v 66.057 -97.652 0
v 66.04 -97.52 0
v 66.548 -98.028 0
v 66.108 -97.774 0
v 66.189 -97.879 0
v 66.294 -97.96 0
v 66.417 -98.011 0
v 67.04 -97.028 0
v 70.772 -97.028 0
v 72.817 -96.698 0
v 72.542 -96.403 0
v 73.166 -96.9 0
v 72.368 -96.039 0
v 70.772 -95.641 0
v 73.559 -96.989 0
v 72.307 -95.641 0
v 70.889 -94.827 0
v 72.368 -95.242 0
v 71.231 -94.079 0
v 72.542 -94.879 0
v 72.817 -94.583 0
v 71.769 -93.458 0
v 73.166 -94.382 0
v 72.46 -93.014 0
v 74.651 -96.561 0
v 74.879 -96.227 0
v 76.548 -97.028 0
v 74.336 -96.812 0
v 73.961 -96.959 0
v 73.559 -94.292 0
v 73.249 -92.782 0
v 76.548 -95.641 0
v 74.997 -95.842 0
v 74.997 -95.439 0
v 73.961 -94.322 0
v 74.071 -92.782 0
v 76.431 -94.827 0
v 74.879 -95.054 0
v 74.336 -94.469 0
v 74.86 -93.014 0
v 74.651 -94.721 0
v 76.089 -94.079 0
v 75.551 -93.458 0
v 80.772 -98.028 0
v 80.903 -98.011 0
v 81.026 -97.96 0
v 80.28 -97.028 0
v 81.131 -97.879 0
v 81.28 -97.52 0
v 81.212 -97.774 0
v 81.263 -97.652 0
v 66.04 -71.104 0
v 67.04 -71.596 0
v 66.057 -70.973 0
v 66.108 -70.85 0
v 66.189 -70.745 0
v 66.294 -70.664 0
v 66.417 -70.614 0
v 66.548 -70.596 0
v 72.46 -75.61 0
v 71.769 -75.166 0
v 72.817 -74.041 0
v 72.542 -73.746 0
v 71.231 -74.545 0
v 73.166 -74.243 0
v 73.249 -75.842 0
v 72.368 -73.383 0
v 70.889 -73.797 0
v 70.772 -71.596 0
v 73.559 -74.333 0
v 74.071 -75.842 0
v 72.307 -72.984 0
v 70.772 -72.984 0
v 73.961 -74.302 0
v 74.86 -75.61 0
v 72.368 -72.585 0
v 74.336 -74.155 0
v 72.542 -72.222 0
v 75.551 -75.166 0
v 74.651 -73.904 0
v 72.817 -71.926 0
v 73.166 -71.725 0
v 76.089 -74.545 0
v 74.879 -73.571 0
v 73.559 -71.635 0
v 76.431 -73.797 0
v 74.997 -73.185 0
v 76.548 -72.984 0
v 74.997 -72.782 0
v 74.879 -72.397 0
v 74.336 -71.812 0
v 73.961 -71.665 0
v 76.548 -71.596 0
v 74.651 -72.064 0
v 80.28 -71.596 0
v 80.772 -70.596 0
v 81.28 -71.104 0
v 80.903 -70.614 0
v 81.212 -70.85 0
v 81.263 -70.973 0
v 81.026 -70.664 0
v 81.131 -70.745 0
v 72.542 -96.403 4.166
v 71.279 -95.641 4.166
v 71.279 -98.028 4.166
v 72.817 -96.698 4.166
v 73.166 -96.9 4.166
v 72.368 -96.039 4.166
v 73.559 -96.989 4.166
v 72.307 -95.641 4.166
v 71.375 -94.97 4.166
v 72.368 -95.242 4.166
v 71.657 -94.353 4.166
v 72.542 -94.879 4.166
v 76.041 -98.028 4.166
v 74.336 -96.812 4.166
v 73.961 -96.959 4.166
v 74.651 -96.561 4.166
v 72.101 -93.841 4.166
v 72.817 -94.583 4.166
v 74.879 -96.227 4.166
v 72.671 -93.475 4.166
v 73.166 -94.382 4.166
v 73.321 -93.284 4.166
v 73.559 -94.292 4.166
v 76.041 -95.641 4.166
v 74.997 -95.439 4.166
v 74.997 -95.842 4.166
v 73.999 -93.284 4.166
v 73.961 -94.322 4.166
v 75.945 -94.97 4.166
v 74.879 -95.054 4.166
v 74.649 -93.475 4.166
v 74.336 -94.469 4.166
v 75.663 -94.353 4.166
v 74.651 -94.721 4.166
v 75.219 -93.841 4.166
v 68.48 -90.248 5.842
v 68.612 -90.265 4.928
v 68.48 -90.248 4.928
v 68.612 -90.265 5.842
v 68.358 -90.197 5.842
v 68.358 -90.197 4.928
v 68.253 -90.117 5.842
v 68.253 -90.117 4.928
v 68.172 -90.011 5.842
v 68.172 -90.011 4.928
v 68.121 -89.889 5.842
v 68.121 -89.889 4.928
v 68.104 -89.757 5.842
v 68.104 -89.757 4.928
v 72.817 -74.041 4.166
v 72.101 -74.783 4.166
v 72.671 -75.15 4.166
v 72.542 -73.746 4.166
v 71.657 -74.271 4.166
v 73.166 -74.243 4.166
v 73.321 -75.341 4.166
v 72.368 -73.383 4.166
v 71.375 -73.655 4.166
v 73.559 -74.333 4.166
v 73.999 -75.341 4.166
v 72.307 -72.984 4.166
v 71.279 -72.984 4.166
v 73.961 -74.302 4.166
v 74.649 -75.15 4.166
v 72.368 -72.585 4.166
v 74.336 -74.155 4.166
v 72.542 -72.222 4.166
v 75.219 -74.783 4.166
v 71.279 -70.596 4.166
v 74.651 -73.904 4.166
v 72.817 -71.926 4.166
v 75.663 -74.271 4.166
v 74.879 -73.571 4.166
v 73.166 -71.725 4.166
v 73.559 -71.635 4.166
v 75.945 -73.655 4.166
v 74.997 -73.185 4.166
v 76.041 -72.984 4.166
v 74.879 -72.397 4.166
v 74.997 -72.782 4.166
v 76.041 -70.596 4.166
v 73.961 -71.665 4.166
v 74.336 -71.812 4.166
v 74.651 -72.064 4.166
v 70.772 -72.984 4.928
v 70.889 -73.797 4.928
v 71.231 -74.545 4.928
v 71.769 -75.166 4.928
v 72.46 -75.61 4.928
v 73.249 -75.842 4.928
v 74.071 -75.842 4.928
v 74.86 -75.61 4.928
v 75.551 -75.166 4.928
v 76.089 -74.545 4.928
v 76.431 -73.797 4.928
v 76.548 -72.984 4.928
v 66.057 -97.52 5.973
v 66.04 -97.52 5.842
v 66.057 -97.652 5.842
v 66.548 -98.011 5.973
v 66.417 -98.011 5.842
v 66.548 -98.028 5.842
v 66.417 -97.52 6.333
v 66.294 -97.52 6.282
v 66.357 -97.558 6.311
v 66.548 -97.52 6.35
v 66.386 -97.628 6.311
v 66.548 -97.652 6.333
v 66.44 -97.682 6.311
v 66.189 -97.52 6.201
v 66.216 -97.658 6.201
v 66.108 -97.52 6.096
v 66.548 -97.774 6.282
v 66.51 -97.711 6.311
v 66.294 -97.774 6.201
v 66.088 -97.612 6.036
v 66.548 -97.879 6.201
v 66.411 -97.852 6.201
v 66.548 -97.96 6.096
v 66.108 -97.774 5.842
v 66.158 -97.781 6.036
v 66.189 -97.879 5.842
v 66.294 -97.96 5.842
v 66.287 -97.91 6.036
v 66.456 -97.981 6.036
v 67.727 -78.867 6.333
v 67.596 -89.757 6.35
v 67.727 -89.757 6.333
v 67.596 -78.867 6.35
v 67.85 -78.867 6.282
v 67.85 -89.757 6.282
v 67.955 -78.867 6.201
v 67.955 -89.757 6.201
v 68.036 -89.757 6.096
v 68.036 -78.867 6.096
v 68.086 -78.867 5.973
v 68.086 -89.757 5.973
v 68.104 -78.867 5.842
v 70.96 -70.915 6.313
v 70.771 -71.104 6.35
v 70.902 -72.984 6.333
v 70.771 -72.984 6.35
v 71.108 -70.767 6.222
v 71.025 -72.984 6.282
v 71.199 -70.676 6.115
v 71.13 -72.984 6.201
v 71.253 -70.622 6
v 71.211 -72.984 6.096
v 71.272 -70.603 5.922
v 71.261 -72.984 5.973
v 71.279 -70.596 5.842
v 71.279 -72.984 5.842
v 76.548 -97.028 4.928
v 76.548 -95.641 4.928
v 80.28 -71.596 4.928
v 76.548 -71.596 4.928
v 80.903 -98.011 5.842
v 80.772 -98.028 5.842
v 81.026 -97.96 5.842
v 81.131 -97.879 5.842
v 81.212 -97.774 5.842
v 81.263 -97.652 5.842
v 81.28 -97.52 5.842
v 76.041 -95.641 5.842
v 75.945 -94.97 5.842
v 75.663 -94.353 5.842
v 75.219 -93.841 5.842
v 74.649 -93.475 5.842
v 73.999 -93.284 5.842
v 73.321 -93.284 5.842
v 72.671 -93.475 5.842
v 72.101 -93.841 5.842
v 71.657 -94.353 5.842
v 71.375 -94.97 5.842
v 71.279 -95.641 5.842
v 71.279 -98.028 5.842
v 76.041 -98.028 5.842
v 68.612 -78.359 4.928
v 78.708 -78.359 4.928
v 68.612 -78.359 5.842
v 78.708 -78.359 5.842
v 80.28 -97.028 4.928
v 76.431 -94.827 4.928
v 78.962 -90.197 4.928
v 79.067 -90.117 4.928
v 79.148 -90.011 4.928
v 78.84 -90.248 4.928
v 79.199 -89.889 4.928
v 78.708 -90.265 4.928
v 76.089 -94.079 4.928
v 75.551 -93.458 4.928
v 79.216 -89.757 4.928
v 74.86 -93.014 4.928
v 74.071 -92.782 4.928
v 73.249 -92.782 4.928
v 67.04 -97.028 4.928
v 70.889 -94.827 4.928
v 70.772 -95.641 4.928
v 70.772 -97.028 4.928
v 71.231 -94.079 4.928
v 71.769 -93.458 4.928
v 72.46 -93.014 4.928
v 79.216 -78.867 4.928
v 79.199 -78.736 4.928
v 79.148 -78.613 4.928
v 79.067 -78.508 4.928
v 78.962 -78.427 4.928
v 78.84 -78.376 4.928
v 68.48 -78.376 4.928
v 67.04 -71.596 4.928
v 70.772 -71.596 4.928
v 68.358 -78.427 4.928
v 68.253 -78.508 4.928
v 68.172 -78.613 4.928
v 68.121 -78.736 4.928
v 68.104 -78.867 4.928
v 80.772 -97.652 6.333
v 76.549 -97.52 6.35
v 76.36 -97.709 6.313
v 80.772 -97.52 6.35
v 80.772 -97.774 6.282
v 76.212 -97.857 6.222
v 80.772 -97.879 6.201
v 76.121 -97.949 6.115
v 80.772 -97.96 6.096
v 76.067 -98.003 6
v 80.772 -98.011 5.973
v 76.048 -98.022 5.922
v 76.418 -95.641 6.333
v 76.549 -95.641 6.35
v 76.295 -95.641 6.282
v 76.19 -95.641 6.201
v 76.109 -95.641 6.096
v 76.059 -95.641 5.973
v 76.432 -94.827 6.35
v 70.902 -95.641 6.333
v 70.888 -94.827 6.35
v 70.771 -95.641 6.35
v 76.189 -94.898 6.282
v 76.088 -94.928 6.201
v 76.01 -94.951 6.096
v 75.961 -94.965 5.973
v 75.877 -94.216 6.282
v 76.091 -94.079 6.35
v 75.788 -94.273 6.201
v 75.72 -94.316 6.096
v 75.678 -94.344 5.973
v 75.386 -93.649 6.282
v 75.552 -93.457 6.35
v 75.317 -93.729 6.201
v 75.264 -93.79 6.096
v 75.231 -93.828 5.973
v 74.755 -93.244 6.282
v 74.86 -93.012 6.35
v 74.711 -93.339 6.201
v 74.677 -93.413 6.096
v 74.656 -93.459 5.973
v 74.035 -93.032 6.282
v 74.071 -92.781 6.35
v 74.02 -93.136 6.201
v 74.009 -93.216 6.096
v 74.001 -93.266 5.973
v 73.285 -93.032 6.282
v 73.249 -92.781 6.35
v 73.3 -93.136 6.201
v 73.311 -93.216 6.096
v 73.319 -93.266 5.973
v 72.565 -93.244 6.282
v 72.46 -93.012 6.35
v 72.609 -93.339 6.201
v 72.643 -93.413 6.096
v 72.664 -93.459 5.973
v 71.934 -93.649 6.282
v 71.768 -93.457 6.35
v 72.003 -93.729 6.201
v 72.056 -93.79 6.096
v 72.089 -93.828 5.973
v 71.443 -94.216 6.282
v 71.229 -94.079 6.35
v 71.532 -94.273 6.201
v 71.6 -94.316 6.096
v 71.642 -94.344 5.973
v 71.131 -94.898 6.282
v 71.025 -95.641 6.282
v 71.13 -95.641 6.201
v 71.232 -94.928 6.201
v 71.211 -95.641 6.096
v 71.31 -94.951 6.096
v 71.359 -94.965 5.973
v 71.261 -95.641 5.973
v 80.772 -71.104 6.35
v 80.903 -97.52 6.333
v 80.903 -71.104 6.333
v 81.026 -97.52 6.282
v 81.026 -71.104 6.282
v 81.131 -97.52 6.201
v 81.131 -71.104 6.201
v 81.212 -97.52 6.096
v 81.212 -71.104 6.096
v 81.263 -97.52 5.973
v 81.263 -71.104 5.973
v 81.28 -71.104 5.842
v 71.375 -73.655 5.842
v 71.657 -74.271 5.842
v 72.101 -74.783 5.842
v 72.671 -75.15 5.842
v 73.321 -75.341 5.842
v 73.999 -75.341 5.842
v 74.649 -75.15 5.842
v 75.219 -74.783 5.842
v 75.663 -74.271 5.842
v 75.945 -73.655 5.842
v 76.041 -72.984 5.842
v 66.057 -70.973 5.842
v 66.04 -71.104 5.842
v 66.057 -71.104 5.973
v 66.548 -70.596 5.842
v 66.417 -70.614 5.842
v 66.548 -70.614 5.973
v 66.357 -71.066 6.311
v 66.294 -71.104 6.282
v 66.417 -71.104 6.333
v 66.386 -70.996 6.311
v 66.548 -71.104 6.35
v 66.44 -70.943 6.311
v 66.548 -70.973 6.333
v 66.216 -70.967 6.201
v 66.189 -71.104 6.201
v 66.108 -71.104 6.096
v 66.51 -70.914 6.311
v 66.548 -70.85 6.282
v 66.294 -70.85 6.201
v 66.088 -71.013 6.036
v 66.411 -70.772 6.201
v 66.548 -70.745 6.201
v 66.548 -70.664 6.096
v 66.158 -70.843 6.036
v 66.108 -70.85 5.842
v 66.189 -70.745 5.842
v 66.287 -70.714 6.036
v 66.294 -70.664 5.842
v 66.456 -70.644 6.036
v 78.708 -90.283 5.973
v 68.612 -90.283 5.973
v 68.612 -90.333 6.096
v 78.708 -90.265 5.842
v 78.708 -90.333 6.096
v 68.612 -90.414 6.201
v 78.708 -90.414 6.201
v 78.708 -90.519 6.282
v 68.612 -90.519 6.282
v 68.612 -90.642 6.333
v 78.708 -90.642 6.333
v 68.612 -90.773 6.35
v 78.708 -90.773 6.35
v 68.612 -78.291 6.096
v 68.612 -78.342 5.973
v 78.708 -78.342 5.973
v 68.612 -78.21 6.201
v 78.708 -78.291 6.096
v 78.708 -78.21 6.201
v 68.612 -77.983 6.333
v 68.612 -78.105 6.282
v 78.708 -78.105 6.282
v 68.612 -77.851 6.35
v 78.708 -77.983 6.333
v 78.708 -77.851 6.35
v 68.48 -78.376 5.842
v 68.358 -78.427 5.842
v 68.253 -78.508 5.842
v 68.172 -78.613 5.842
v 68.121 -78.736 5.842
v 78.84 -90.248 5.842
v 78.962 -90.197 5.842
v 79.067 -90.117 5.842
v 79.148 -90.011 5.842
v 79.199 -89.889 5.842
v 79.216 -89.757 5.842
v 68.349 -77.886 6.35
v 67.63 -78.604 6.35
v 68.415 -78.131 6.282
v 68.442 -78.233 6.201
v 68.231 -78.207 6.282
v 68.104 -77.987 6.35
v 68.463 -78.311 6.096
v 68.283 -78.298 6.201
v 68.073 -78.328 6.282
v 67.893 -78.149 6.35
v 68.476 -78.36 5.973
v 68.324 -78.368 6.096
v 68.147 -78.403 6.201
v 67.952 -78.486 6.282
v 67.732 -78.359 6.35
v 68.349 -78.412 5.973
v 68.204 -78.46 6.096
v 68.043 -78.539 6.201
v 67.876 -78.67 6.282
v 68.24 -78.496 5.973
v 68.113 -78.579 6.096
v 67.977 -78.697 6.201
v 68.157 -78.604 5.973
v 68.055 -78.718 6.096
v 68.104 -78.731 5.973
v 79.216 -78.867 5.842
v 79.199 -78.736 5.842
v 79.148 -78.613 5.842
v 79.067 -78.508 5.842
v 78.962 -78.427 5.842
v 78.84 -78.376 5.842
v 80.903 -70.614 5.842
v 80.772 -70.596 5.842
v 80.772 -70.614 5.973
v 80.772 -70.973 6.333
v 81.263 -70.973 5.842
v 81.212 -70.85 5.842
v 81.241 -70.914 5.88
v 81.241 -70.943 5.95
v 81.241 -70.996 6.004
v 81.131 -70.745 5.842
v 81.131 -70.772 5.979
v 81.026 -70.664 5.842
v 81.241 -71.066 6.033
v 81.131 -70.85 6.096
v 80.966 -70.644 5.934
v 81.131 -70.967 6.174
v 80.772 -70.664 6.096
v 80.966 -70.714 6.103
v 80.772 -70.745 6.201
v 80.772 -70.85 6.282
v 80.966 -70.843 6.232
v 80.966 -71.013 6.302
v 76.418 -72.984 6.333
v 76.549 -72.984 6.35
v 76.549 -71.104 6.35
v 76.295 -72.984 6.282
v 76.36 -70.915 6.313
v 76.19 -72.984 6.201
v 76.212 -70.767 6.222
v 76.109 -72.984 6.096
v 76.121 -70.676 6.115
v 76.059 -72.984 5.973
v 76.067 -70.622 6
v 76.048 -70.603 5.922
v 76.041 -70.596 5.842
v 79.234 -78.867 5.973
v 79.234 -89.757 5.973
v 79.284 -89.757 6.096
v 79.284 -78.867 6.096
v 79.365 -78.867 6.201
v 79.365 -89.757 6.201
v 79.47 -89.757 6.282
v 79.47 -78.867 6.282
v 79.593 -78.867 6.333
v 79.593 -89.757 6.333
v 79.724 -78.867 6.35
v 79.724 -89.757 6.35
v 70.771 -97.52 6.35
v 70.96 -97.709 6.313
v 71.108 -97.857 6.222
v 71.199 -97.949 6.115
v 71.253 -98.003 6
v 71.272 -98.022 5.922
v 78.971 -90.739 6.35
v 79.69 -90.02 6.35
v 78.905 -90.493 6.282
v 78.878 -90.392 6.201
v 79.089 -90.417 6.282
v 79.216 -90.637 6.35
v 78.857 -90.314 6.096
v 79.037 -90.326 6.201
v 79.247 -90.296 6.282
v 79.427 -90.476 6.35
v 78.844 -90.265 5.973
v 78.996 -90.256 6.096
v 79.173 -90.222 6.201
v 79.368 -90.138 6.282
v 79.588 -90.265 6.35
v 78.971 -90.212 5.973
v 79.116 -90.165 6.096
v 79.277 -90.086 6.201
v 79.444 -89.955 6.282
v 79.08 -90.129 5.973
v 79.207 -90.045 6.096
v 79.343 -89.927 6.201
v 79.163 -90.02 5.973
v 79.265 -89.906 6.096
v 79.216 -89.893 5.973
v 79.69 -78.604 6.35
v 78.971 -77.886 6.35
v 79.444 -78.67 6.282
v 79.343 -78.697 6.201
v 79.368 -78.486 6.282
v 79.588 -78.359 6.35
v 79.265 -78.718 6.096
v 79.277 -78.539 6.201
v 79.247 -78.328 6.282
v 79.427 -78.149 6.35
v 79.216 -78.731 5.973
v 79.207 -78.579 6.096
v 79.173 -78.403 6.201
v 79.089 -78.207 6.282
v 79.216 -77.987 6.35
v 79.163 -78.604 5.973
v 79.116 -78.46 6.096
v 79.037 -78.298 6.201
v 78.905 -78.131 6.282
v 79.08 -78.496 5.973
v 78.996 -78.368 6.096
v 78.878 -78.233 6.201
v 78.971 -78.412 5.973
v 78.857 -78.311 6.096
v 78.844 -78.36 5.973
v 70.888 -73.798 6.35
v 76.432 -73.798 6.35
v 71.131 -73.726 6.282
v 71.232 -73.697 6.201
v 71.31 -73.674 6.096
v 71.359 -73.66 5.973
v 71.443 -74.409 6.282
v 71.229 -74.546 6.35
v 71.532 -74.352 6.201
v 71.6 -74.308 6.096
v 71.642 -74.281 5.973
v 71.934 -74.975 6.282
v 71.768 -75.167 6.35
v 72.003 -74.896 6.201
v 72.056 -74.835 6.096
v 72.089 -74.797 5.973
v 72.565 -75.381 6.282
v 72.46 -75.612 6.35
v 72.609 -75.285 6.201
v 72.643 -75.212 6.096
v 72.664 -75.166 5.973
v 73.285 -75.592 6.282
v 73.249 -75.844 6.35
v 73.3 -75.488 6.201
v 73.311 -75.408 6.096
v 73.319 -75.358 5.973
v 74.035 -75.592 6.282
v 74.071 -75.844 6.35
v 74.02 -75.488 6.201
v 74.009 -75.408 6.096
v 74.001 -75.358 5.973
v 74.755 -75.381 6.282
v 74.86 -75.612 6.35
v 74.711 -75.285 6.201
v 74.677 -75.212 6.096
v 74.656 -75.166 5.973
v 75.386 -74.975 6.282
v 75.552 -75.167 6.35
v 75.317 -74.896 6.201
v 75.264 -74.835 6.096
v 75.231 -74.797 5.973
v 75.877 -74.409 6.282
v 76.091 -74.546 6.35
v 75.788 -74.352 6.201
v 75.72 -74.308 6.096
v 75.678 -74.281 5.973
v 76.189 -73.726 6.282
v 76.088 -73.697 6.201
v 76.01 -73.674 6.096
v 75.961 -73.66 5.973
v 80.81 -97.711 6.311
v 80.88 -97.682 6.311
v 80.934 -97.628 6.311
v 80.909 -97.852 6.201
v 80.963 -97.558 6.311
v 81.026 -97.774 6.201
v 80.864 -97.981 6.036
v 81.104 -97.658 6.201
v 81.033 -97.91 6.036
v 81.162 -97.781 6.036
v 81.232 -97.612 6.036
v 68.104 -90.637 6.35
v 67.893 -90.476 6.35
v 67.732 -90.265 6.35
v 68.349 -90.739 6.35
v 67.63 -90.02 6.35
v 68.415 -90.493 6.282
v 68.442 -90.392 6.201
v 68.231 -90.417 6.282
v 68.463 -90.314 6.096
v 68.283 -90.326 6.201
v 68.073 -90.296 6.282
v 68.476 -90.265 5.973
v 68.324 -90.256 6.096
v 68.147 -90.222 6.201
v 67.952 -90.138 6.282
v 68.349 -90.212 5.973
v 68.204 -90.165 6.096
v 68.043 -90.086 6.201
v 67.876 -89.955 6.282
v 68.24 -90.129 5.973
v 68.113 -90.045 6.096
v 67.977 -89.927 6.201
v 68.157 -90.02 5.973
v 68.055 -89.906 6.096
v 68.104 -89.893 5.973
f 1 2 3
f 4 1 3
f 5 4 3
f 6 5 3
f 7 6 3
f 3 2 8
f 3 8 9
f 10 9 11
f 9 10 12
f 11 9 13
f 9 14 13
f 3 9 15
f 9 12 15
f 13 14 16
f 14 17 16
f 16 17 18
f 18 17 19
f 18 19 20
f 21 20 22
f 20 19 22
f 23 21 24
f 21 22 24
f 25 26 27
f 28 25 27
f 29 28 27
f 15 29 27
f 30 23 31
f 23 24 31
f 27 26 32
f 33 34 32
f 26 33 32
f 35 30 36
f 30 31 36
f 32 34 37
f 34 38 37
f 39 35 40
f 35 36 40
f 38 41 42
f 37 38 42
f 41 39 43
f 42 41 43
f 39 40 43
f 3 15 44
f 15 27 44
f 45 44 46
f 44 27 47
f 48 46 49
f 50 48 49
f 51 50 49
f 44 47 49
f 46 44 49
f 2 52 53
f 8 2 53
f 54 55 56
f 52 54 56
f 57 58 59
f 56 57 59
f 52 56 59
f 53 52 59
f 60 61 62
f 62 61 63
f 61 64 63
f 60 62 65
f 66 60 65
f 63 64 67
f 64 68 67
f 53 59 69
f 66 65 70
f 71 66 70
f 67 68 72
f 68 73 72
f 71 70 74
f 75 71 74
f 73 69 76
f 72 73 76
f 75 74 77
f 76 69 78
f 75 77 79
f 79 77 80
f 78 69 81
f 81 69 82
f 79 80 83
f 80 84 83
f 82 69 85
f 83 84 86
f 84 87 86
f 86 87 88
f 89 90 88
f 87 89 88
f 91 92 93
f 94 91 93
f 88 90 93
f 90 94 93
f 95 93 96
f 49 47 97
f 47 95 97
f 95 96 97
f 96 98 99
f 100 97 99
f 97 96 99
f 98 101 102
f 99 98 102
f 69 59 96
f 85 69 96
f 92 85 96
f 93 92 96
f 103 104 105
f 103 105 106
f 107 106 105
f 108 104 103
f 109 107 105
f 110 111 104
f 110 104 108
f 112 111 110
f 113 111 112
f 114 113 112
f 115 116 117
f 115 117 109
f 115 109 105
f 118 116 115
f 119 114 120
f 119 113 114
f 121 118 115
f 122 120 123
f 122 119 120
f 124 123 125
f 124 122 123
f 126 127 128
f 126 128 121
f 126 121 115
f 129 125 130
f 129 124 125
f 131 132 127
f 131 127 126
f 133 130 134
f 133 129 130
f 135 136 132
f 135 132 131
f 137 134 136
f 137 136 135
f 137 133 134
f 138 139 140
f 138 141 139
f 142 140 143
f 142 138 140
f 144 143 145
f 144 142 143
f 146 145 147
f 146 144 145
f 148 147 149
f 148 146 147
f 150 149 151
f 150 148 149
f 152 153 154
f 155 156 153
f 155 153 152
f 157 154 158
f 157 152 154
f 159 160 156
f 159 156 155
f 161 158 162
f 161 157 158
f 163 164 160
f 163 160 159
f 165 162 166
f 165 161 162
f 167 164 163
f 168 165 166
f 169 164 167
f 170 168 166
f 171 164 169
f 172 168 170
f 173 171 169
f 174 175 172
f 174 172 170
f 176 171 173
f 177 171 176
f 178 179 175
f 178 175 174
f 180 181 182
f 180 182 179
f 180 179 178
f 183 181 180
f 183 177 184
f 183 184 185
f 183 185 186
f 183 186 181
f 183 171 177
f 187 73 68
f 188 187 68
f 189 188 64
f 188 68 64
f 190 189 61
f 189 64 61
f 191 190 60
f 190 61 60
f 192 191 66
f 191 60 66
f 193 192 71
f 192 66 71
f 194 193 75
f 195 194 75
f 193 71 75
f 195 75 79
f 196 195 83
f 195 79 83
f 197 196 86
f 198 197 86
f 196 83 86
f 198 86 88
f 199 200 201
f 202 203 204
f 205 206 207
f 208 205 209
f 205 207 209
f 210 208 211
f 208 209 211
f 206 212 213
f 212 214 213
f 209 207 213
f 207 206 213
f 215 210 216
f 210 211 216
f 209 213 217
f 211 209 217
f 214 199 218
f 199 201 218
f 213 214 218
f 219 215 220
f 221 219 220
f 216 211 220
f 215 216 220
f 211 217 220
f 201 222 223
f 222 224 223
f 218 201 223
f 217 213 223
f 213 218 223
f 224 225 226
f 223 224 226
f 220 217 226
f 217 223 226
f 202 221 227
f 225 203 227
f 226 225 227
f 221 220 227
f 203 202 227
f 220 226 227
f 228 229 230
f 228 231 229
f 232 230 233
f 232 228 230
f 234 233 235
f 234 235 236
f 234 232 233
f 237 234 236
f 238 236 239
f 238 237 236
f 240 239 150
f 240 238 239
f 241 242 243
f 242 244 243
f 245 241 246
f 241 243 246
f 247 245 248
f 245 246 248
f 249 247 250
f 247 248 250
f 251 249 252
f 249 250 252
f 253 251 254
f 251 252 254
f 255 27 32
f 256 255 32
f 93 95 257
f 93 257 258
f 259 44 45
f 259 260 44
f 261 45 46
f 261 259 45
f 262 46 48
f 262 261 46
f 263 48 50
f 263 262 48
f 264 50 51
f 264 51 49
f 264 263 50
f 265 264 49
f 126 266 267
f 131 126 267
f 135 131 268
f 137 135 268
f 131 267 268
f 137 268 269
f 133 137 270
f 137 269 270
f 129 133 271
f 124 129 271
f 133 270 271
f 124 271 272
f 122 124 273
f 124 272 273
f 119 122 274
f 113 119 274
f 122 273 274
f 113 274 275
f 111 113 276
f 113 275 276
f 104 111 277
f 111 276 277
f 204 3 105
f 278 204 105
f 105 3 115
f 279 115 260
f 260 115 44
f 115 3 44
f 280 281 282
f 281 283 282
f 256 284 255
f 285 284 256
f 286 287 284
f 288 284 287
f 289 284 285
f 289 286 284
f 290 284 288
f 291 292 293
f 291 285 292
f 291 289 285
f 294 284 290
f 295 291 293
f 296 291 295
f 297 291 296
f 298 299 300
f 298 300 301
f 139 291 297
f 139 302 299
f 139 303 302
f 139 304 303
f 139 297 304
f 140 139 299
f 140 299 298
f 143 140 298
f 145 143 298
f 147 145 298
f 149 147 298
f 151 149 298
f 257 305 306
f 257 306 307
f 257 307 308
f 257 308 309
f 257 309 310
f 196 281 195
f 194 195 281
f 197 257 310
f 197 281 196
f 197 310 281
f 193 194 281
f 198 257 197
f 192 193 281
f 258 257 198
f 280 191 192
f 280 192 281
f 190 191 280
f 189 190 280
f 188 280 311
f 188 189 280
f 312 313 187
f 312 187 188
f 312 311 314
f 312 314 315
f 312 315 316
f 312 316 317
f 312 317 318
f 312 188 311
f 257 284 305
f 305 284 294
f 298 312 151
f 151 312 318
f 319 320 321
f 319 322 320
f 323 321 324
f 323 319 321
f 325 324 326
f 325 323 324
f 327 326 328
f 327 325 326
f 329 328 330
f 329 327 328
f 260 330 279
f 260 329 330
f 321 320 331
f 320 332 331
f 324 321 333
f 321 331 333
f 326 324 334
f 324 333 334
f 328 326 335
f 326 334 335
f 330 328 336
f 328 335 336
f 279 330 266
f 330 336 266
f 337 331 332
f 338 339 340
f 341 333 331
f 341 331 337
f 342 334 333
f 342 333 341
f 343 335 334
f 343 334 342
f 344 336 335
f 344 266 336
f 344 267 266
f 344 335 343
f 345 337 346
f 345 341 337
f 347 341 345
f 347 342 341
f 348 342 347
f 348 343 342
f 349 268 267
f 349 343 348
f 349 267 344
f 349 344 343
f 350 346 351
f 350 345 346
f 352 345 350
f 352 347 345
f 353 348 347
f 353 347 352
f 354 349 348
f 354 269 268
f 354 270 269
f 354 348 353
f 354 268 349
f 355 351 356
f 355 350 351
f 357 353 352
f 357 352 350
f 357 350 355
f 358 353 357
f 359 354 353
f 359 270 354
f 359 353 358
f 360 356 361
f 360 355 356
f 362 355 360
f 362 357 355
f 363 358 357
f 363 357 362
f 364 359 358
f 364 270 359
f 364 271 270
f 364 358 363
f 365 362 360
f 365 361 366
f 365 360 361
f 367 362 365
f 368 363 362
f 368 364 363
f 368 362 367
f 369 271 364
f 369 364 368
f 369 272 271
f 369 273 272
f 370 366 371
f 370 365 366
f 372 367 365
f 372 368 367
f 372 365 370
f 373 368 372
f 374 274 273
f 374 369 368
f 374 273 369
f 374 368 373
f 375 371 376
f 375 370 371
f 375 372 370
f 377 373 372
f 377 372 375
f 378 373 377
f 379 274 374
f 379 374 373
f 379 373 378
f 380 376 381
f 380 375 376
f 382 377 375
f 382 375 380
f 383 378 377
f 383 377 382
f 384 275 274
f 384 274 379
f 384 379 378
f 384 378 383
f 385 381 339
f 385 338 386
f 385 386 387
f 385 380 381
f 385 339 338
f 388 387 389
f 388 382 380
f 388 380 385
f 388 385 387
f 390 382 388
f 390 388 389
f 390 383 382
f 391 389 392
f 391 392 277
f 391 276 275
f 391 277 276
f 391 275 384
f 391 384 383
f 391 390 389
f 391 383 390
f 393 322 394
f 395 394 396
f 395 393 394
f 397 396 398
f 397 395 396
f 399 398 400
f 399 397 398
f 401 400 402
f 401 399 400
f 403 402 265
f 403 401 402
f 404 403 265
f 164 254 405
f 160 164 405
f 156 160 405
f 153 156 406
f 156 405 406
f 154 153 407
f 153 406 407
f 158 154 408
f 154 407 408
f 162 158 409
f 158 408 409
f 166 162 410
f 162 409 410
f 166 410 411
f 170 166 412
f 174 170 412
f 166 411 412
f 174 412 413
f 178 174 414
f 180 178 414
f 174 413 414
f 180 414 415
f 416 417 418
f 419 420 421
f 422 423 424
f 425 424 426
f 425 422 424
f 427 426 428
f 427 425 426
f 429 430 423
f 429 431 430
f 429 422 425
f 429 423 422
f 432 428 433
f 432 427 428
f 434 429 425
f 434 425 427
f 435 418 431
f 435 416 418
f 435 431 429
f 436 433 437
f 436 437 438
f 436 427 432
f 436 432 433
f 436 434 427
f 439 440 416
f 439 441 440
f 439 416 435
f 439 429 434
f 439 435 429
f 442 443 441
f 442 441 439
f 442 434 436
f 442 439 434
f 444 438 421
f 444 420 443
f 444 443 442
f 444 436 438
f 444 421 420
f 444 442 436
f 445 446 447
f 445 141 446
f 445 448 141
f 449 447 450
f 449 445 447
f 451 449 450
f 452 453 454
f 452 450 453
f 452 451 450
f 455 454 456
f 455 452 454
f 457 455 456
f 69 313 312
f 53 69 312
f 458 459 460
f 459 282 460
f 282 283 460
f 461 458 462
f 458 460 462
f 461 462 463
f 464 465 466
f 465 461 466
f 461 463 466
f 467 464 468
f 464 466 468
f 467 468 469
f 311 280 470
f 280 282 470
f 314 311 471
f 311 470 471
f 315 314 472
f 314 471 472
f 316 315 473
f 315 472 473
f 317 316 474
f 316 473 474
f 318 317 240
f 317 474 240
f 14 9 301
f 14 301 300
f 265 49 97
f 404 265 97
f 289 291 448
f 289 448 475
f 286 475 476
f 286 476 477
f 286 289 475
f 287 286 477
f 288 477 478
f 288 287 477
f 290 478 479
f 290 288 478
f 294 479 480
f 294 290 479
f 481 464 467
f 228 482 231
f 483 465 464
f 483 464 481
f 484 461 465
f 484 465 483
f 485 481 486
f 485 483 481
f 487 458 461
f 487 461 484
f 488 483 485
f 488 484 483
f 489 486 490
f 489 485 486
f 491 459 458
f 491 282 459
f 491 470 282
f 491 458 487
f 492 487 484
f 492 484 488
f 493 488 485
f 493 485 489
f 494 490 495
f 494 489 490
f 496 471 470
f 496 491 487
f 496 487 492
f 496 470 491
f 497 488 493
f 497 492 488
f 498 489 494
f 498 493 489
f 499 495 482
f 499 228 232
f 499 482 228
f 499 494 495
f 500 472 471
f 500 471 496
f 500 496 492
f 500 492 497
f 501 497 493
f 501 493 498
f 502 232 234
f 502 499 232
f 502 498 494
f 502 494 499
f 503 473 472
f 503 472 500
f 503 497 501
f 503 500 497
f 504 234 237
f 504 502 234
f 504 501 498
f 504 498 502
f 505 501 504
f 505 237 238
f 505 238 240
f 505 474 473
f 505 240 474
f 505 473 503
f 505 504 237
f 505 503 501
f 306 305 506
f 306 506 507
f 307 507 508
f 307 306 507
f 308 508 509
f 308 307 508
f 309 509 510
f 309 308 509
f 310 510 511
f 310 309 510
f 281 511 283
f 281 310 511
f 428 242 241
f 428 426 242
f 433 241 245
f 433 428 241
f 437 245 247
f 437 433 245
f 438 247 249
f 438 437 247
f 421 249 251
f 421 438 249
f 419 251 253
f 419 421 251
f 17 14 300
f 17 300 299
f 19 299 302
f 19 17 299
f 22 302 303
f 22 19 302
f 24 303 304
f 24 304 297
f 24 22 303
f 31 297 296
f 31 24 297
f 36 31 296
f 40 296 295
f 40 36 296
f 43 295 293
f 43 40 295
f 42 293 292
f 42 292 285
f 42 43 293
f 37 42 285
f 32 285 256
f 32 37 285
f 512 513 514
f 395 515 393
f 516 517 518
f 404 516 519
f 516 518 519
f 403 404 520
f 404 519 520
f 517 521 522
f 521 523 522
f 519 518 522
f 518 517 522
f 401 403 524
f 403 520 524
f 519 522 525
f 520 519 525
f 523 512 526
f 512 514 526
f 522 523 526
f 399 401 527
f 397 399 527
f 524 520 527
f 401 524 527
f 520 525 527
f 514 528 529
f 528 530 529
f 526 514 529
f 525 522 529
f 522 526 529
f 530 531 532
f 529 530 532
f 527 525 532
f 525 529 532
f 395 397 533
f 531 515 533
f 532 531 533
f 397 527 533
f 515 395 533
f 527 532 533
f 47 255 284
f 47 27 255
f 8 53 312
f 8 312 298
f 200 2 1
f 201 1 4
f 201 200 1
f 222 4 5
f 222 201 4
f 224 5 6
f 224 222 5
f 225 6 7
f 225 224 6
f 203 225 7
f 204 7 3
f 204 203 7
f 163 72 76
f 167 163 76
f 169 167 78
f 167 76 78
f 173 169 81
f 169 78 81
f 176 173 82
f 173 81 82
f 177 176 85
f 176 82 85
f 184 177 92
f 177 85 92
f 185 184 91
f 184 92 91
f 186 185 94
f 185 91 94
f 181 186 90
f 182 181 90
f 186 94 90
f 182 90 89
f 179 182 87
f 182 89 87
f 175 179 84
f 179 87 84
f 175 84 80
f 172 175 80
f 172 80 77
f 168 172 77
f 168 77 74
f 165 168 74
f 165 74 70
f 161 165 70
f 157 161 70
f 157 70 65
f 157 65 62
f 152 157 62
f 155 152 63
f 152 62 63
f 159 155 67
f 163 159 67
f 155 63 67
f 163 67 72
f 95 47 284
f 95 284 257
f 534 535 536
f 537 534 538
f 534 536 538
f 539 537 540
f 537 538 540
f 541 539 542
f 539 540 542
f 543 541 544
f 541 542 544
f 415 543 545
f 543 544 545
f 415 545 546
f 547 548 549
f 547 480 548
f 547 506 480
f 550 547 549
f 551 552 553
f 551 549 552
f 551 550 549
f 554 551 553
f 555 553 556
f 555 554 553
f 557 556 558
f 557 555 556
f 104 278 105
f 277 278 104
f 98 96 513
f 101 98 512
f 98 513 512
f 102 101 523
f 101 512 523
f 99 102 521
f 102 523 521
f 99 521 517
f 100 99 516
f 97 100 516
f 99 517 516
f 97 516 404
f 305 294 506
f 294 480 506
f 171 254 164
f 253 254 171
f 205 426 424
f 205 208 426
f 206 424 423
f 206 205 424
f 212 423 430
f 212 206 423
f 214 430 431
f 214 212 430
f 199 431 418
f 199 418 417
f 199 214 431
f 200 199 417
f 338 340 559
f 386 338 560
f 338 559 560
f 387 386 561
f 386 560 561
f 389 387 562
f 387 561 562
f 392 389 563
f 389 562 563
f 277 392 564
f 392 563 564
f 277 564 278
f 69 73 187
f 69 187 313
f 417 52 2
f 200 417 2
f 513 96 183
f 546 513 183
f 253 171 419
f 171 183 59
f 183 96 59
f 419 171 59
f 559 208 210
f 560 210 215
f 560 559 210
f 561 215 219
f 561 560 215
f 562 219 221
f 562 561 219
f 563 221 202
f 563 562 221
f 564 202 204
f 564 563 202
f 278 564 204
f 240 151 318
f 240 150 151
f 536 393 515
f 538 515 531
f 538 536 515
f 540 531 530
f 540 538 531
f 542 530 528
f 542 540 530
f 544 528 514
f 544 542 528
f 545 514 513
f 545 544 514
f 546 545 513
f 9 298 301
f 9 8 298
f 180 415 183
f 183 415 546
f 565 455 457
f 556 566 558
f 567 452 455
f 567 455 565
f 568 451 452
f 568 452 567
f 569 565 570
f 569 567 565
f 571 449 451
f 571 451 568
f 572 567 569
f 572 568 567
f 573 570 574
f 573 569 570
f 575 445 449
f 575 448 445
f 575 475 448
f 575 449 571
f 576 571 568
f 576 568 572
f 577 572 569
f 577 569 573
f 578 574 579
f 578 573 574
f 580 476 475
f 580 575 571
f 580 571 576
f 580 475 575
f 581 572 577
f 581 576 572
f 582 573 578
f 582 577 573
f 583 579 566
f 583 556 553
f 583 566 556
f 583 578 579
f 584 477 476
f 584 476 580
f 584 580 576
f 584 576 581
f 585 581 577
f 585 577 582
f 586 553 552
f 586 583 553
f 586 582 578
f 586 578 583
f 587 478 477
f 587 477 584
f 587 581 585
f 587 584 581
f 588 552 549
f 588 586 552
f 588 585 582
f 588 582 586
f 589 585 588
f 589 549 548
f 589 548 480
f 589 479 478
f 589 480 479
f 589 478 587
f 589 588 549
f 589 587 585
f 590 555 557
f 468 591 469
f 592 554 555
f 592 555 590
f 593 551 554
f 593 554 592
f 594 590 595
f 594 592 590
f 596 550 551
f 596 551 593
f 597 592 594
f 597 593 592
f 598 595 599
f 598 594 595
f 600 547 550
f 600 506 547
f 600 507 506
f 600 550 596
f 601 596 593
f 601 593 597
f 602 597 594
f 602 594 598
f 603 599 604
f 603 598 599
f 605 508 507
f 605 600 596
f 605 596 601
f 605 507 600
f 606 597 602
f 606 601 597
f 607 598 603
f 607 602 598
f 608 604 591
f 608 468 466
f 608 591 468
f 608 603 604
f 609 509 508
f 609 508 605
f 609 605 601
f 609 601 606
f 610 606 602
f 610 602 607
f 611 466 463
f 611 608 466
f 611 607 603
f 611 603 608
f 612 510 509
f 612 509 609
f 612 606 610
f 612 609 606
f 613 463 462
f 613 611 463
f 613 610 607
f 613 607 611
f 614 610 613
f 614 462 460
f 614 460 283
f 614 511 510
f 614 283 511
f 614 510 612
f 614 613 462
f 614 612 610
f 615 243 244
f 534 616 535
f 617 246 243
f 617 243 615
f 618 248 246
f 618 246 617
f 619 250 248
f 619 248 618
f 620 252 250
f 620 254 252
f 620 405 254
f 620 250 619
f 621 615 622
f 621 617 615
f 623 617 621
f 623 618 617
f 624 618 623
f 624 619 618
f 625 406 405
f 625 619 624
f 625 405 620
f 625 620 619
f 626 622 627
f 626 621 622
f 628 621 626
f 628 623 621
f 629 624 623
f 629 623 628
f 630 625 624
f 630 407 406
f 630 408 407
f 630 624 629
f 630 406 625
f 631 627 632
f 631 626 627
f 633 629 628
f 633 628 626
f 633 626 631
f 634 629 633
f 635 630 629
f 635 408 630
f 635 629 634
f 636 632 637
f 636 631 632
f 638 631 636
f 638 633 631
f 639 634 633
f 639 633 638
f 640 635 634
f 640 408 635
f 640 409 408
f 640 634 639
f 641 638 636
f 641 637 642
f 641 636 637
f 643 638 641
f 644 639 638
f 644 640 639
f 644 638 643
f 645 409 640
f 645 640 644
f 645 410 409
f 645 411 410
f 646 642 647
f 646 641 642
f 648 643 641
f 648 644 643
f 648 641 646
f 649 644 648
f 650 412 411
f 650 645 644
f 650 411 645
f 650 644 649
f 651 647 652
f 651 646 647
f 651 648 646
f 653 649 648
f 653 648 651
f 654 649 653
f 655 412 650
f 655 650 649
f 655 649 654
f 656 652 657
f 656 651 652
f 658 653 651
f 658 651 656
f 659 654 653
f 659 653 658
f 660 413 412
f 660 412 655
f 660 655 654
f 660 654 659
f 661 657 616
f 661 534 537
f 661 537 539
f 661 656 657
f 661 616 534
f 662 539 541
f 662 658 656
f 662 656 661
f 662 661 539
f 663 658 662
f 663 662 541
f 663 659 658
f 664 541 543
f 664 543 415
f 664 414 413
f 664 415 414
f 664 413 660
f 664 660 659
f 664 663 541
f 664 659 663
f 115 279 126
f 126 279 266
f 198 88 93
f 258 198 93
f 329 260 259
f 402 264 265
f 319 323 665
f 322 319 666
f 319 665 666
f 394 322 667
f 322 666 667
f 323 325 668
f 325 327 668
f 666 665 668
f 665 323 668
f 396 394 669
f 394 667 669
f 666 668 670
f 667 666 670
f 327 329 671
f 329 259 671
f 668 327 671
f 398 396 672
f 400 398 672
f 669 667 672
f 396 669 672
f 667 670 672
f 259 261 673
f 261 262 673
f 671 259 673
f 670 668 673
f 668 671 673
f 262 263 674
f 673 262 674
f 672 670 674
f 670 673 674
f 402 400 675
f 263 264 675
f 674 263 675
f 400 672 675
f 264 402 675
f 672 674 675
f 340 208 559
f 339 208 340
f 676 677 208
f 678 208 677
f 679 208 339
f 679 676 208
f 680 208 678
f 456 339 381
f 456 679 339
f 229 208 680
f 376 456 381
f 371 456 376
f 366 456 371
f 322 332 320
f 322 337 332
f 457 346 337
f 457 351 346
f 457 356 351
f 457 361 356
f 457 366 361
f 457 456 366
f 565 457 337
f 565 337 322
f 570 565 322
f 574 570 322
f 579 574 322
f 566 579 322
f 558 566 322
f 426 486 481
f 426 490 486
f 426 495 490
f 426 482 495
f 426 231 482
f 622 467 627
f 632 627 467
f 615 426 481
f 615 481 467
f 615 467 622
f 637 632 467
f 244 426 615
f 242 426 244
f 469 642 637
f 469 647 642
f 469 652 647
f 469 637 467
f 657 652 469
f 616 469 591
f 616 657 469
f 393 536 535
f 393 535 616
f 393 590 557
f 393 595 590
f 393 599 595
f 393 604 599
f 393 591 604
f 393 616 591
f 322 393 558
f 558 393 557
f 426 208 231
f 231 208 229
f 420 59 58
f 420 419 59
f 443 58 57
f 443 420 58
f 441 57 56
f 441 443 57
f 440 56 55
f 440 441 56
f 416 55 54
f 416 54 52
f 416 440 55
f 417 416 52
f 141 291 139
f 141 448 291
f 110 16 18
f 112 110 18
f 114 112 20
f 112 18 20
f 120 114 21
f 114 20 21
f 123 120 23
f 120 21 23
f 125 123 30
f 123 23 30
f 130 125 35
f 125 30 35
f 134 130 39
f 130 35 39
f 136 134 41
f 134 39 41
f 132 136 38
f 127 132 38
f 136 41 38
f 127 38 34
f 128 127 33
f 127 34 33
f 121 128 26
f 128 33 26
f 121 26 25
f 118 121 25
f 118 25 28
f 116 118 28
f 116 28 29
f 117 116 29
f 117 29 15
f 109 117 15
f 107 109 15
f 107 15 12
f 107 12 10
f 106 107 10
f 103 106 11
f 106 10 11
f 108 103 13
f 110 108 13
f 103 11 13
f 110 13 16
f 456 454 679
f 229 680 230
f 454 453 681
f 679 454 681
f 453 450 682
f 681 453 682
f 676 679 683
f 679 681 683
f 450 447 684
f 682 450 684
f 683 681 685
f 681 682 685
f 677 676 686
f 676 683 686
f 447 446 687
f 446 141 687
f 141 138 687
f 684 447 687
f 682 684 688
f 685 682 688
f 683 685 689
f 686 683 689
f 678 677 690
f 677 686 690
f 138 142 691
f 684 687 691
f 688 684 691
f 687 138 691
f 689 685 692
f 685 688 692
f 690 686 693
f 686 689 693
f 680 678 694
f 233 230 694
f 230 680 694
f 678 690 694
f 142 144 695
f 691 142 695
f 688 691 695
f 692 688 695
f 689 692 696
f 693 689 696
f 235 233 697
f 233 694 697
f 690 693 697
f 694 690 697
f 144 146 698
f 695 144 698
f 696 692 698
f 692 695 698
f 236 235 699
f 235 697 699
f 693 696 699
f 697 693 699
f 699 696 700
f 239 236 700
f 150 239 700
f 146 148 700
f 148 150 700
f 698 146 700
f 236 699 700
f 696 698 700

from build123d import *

# Parameters (mm, degrees)
BOSS_EXTRUDE1_DEPTH                            = 6.35
SKETCH2_W                                      = 11.1125
SKETCH2_H                                      = 11.90625
CUT_EXTRUDE1_DEPTH                             = 7.35
SHELL1_T                                       = -1
BOSS_EXTRUDE2_REACH                            = 8.35
SKETCH5_W                                      = 5.7752
SKETCH5_H                                      = 5.7752
CBORE_FOR_2_SOCKET_HEAD_CAP_SCREW2_D           = 2.7051
CBORE_FOR_2_SOCKET_HEAD_CAP_SCREW2_CBORE_D     = 4.7625
CBORE_FOR_2_SOCKET_HEAD_CAP_SCREW2_CBORE_DEPTH = 2.1844
CUT_EXTRUDE2_DEPTH                             = 4.9276
SKETCH7_W                                      = 11.1125
SKETCH7_H                                      = 11.90625
BOSS_EXTRUDE4_DEPTH                            = 0.4224
SKETCH8_W                                      = 4.7625
SKETCH8_H                                      = 2.3876
CUT_EXTRUDE3_DEPTH                             = 2.1844
FILLET1_R                                      = 0.508


with BuildPart() as part:
    # Sketch1 → Boss-Extrude1 (new body)
    with BuildSketch(Plane.XY):
        Polygon((81.28, -96.5042297), (81.28, -72.1202297), (81.28, -70.5962297), (66.04, -70.5962297), (66.04, -72.1202297), (66.04, -96.5042297), (66.04, -98.0282297), (81.28, -98.0282297), align=None)
    extrude(amount=BOSS_EXTRUDE1_DEPTH)

    # Sketch2 → Cut-Extrude1 (cut, through all)
    with BuildSketch(Plane.XY.offset(6.35)):
        with Locations((73.66, -84.3122297)):
            Rectangle(SKETCH2_W, SKETCH2_H)
    extrude(amount=-CUT_EXTRUDE1_DEPTH, mode=Mode.SUBTRACT)

    # Shell1
    shell1_openings = [part.faces().sort_by_distance(p)[0] for p in [
        (73.66, -90.2653547, 3.175),
        (68.10375, -84.3122297, 3.175),
        (73.66, -78.3591047, 3.175),
        (79.21625, -84.3122297, 3.175),
        (73.66, -84.3122297, 0),
    ]]
    offset(amount=SHELL1_T, openings=shell1_openings, kind=Kind.INTERSECTION)

    # Sketch5 → Boss-Extrude2 (add, up to next)
    with BuildSketch(Plane(origin=(0, 0, 0), x_dir=(-1, 0, 0), z_dir=(0, 0, -1)), mode=Mode.PRIVATE) as boss_extrude2_sk1:
        with Locations((-73.66, -73.4838297)):
            Rectangle(SKETCH5_W, SKETCH5_H)
    boss_extrude2_tool1 = extrude(boss_extrude2_sk1.sketch, amount=-BOSS_EXTRUDE2_REACH, mode=Mode.PRIVATE) - part.part
    add(boss_extrude2_tool1.solids().sort_by_distance((73.66, -73.48383, 0))[0])
    # Sketch5 → Boss-Extrude2 (add, up to next)
    with BuildSketch(Plane(origin=(0, 0, 0), x_dir=(-1, 0, 0), z_dir=(0, 0, -1)), mode=Mode.PRIVATE) as boss_extrude2_sk2:
        with Locations((-73.66, -95.1406297)):
            Rectangle(SKETCH5_W, SKETCH5_H)
    boss_extrude2_tool2 = extrude(boss_extrude2_sk2.sketch, amount=-BOSS_EXTRUDE2_REACH, mode=Mode.PRIVATE) - part.part
    add(boss_extrude2_tool2.solids().sort_by_distance((73.66, -95.14063, 0))[0])

    # CBORE for #2 Socket Head Cap Screw2 (through all)
    with Locations(Plane.XY.offset(6.35)):
        with Locations((73.66, -95.6406297), (73.66, -72.9838297)):
            CounterBoreHole(CBORE_FOR_2_SOCKET_HEAD_CAP_SCREW2_D / 2, CBORE_FOR_2_SOCKET_HEAD_CAP_SCREW2_CBORE_D / 2, CBORE_FOR_2_SOCKET_HEAD_CAP_SCREW2_CBORE_DEPTH)

    # Sketch6 → Cut-Extrude2 (cut)
    with BuildSketch(Plane(origin=(0, 0, 0), x_dir=(-1, 0, 0), z_dir=(0, 0, -1))):
        with BuildLine():
            Line((-76.5476, -95.6406297), (-76.8016, -95.6406297))
            Line((-76.8016, -95.6406297), (-76.8016, -92.2530297))
            Line((-76.8016, -92.2530297), (-70.5184, -92.2530297))
            Line((-70.5184, -92.2530297), (-70.5184, -95.6406297))
            Line((-70.5184, -95.6406297), (-70.7724, -95.6406297))
            ThreePointArc((-70.7724, -95.6406297), (-73.66, -92.7530297), (-76.5476, -95.6406297))
        make_face()
        with BuildLine():
            Line((-76.8016, -72.9838297), (-76.8016, -76.3714297))
            Line((-76.8016, -76.3714297), (-70.5184, -76.3714297))
            Line((-70.5184, -76.3714297), (-70.5184, -72.9838297))
            Line((-70.5184, -72.9838297), (-70.7724, -72.9838297))
            ThreePointArc((-70.7724, -72.9838297), (-73.66, -75.8714297), (-76.5476, -72.9838297))
            Line((-76.5476, -72.9838297), (-76.8016, -72.9838297))
        make_face()
    extrude(amount=-CUT_EXTRUDE2_DEPTH, mode=Mode.SUBTRACT)

    # Sketch7 → Boss-Extrude4 (add)
    with BuildSketch(Plane(origin=(0, 0, 5.35), x_dir=(-1, 0, 0), z_dir=(0, 0, -1))):
        Polygon((-70.7724, -76.3714297), (-76.5476, -76.3714297), (-76.5476, -71.5962297), (-80.28, -71.5962297), (-80.28, -97.0282297), (-76.5476, -97.0282297), (-76.5476, -92.2530297), (-70.7724, -92.2530297), (-70.7724, -97.0282297), (-67.04, -97.0282297), (-67.04, -71.5962297), (-70.7724, -71.5962297), align=None)
        with Locations((-73.66, -84.3122297)):
            Rectangle(SKETCH7_W, SKETCH7_H, mode=Mode.SUBTRACT)
    extrude(amount=BOSS_EXTRUDE4_DEPTH)

    # Sketch8 → Cut-Extrude3 (cut)
    with BuildSketch(Plane.XY.offset(6.35)):
        with Locations((73.66, -96.8344297)):
            Rectangle(SKETCH8_W, SKETCH8_H)
        with Locations((73.66, -71.7900297)):
            Rectangle(SKETCH8_W, SKETCH8_H)
    extrude(amount=-CUT_EXTRUDE3_DEPTH, mode=Mode.SUBTRACT)

    # Fillet1
    fillet1_edges = [part.edges().sort_by_distance(p)[0] for p in [
        (73.66, -93.2593797, 6.35),
        (78.660625, -70.5962297, 6.35),
        (81.28, -98.0282297, 3.175),
        (66.04, -98.0282297, 3.175),
        (66.04, -70.5962297, 3.175),
        (81.28, -70.5962297, 3.175),
        (66.04, -84.3122297, 6.35),
        (78.660625, -98.0282297, 6.35),
        (76.04125, -96.8344297, 6.35),
        (71.27875, -96.8344297, 6.35),
        (73.66, -75.3650797, 6.35),
        (68.659375, -70.5962297, 6.35),
        (71.27875, -71.7900297, 6.35),
        (76.04125, -71.7900297, 6.35),
        (68.659375, -98.0282297, 6.35),
        (79.21625, -90.2653547, 5.6388),
        (68.10375, -90.2653547, 5.6388),
        (68.10375, -78.3591047, 5.6388),
        (79.21625, -78.3591047, 5.6388),
        (73.66, -90.2653547, 6.35),
        (79.21625, -84.3122297, 6.35),
        (73.66, -78.3591047, 6.35),
        (68.10375, -84.3122297, 6.35),
        (81.28, -84.3122297, 6.35),
    ]]
    fillet(fillet1_edges, radius=FILLET1_R)


solid = part.part
